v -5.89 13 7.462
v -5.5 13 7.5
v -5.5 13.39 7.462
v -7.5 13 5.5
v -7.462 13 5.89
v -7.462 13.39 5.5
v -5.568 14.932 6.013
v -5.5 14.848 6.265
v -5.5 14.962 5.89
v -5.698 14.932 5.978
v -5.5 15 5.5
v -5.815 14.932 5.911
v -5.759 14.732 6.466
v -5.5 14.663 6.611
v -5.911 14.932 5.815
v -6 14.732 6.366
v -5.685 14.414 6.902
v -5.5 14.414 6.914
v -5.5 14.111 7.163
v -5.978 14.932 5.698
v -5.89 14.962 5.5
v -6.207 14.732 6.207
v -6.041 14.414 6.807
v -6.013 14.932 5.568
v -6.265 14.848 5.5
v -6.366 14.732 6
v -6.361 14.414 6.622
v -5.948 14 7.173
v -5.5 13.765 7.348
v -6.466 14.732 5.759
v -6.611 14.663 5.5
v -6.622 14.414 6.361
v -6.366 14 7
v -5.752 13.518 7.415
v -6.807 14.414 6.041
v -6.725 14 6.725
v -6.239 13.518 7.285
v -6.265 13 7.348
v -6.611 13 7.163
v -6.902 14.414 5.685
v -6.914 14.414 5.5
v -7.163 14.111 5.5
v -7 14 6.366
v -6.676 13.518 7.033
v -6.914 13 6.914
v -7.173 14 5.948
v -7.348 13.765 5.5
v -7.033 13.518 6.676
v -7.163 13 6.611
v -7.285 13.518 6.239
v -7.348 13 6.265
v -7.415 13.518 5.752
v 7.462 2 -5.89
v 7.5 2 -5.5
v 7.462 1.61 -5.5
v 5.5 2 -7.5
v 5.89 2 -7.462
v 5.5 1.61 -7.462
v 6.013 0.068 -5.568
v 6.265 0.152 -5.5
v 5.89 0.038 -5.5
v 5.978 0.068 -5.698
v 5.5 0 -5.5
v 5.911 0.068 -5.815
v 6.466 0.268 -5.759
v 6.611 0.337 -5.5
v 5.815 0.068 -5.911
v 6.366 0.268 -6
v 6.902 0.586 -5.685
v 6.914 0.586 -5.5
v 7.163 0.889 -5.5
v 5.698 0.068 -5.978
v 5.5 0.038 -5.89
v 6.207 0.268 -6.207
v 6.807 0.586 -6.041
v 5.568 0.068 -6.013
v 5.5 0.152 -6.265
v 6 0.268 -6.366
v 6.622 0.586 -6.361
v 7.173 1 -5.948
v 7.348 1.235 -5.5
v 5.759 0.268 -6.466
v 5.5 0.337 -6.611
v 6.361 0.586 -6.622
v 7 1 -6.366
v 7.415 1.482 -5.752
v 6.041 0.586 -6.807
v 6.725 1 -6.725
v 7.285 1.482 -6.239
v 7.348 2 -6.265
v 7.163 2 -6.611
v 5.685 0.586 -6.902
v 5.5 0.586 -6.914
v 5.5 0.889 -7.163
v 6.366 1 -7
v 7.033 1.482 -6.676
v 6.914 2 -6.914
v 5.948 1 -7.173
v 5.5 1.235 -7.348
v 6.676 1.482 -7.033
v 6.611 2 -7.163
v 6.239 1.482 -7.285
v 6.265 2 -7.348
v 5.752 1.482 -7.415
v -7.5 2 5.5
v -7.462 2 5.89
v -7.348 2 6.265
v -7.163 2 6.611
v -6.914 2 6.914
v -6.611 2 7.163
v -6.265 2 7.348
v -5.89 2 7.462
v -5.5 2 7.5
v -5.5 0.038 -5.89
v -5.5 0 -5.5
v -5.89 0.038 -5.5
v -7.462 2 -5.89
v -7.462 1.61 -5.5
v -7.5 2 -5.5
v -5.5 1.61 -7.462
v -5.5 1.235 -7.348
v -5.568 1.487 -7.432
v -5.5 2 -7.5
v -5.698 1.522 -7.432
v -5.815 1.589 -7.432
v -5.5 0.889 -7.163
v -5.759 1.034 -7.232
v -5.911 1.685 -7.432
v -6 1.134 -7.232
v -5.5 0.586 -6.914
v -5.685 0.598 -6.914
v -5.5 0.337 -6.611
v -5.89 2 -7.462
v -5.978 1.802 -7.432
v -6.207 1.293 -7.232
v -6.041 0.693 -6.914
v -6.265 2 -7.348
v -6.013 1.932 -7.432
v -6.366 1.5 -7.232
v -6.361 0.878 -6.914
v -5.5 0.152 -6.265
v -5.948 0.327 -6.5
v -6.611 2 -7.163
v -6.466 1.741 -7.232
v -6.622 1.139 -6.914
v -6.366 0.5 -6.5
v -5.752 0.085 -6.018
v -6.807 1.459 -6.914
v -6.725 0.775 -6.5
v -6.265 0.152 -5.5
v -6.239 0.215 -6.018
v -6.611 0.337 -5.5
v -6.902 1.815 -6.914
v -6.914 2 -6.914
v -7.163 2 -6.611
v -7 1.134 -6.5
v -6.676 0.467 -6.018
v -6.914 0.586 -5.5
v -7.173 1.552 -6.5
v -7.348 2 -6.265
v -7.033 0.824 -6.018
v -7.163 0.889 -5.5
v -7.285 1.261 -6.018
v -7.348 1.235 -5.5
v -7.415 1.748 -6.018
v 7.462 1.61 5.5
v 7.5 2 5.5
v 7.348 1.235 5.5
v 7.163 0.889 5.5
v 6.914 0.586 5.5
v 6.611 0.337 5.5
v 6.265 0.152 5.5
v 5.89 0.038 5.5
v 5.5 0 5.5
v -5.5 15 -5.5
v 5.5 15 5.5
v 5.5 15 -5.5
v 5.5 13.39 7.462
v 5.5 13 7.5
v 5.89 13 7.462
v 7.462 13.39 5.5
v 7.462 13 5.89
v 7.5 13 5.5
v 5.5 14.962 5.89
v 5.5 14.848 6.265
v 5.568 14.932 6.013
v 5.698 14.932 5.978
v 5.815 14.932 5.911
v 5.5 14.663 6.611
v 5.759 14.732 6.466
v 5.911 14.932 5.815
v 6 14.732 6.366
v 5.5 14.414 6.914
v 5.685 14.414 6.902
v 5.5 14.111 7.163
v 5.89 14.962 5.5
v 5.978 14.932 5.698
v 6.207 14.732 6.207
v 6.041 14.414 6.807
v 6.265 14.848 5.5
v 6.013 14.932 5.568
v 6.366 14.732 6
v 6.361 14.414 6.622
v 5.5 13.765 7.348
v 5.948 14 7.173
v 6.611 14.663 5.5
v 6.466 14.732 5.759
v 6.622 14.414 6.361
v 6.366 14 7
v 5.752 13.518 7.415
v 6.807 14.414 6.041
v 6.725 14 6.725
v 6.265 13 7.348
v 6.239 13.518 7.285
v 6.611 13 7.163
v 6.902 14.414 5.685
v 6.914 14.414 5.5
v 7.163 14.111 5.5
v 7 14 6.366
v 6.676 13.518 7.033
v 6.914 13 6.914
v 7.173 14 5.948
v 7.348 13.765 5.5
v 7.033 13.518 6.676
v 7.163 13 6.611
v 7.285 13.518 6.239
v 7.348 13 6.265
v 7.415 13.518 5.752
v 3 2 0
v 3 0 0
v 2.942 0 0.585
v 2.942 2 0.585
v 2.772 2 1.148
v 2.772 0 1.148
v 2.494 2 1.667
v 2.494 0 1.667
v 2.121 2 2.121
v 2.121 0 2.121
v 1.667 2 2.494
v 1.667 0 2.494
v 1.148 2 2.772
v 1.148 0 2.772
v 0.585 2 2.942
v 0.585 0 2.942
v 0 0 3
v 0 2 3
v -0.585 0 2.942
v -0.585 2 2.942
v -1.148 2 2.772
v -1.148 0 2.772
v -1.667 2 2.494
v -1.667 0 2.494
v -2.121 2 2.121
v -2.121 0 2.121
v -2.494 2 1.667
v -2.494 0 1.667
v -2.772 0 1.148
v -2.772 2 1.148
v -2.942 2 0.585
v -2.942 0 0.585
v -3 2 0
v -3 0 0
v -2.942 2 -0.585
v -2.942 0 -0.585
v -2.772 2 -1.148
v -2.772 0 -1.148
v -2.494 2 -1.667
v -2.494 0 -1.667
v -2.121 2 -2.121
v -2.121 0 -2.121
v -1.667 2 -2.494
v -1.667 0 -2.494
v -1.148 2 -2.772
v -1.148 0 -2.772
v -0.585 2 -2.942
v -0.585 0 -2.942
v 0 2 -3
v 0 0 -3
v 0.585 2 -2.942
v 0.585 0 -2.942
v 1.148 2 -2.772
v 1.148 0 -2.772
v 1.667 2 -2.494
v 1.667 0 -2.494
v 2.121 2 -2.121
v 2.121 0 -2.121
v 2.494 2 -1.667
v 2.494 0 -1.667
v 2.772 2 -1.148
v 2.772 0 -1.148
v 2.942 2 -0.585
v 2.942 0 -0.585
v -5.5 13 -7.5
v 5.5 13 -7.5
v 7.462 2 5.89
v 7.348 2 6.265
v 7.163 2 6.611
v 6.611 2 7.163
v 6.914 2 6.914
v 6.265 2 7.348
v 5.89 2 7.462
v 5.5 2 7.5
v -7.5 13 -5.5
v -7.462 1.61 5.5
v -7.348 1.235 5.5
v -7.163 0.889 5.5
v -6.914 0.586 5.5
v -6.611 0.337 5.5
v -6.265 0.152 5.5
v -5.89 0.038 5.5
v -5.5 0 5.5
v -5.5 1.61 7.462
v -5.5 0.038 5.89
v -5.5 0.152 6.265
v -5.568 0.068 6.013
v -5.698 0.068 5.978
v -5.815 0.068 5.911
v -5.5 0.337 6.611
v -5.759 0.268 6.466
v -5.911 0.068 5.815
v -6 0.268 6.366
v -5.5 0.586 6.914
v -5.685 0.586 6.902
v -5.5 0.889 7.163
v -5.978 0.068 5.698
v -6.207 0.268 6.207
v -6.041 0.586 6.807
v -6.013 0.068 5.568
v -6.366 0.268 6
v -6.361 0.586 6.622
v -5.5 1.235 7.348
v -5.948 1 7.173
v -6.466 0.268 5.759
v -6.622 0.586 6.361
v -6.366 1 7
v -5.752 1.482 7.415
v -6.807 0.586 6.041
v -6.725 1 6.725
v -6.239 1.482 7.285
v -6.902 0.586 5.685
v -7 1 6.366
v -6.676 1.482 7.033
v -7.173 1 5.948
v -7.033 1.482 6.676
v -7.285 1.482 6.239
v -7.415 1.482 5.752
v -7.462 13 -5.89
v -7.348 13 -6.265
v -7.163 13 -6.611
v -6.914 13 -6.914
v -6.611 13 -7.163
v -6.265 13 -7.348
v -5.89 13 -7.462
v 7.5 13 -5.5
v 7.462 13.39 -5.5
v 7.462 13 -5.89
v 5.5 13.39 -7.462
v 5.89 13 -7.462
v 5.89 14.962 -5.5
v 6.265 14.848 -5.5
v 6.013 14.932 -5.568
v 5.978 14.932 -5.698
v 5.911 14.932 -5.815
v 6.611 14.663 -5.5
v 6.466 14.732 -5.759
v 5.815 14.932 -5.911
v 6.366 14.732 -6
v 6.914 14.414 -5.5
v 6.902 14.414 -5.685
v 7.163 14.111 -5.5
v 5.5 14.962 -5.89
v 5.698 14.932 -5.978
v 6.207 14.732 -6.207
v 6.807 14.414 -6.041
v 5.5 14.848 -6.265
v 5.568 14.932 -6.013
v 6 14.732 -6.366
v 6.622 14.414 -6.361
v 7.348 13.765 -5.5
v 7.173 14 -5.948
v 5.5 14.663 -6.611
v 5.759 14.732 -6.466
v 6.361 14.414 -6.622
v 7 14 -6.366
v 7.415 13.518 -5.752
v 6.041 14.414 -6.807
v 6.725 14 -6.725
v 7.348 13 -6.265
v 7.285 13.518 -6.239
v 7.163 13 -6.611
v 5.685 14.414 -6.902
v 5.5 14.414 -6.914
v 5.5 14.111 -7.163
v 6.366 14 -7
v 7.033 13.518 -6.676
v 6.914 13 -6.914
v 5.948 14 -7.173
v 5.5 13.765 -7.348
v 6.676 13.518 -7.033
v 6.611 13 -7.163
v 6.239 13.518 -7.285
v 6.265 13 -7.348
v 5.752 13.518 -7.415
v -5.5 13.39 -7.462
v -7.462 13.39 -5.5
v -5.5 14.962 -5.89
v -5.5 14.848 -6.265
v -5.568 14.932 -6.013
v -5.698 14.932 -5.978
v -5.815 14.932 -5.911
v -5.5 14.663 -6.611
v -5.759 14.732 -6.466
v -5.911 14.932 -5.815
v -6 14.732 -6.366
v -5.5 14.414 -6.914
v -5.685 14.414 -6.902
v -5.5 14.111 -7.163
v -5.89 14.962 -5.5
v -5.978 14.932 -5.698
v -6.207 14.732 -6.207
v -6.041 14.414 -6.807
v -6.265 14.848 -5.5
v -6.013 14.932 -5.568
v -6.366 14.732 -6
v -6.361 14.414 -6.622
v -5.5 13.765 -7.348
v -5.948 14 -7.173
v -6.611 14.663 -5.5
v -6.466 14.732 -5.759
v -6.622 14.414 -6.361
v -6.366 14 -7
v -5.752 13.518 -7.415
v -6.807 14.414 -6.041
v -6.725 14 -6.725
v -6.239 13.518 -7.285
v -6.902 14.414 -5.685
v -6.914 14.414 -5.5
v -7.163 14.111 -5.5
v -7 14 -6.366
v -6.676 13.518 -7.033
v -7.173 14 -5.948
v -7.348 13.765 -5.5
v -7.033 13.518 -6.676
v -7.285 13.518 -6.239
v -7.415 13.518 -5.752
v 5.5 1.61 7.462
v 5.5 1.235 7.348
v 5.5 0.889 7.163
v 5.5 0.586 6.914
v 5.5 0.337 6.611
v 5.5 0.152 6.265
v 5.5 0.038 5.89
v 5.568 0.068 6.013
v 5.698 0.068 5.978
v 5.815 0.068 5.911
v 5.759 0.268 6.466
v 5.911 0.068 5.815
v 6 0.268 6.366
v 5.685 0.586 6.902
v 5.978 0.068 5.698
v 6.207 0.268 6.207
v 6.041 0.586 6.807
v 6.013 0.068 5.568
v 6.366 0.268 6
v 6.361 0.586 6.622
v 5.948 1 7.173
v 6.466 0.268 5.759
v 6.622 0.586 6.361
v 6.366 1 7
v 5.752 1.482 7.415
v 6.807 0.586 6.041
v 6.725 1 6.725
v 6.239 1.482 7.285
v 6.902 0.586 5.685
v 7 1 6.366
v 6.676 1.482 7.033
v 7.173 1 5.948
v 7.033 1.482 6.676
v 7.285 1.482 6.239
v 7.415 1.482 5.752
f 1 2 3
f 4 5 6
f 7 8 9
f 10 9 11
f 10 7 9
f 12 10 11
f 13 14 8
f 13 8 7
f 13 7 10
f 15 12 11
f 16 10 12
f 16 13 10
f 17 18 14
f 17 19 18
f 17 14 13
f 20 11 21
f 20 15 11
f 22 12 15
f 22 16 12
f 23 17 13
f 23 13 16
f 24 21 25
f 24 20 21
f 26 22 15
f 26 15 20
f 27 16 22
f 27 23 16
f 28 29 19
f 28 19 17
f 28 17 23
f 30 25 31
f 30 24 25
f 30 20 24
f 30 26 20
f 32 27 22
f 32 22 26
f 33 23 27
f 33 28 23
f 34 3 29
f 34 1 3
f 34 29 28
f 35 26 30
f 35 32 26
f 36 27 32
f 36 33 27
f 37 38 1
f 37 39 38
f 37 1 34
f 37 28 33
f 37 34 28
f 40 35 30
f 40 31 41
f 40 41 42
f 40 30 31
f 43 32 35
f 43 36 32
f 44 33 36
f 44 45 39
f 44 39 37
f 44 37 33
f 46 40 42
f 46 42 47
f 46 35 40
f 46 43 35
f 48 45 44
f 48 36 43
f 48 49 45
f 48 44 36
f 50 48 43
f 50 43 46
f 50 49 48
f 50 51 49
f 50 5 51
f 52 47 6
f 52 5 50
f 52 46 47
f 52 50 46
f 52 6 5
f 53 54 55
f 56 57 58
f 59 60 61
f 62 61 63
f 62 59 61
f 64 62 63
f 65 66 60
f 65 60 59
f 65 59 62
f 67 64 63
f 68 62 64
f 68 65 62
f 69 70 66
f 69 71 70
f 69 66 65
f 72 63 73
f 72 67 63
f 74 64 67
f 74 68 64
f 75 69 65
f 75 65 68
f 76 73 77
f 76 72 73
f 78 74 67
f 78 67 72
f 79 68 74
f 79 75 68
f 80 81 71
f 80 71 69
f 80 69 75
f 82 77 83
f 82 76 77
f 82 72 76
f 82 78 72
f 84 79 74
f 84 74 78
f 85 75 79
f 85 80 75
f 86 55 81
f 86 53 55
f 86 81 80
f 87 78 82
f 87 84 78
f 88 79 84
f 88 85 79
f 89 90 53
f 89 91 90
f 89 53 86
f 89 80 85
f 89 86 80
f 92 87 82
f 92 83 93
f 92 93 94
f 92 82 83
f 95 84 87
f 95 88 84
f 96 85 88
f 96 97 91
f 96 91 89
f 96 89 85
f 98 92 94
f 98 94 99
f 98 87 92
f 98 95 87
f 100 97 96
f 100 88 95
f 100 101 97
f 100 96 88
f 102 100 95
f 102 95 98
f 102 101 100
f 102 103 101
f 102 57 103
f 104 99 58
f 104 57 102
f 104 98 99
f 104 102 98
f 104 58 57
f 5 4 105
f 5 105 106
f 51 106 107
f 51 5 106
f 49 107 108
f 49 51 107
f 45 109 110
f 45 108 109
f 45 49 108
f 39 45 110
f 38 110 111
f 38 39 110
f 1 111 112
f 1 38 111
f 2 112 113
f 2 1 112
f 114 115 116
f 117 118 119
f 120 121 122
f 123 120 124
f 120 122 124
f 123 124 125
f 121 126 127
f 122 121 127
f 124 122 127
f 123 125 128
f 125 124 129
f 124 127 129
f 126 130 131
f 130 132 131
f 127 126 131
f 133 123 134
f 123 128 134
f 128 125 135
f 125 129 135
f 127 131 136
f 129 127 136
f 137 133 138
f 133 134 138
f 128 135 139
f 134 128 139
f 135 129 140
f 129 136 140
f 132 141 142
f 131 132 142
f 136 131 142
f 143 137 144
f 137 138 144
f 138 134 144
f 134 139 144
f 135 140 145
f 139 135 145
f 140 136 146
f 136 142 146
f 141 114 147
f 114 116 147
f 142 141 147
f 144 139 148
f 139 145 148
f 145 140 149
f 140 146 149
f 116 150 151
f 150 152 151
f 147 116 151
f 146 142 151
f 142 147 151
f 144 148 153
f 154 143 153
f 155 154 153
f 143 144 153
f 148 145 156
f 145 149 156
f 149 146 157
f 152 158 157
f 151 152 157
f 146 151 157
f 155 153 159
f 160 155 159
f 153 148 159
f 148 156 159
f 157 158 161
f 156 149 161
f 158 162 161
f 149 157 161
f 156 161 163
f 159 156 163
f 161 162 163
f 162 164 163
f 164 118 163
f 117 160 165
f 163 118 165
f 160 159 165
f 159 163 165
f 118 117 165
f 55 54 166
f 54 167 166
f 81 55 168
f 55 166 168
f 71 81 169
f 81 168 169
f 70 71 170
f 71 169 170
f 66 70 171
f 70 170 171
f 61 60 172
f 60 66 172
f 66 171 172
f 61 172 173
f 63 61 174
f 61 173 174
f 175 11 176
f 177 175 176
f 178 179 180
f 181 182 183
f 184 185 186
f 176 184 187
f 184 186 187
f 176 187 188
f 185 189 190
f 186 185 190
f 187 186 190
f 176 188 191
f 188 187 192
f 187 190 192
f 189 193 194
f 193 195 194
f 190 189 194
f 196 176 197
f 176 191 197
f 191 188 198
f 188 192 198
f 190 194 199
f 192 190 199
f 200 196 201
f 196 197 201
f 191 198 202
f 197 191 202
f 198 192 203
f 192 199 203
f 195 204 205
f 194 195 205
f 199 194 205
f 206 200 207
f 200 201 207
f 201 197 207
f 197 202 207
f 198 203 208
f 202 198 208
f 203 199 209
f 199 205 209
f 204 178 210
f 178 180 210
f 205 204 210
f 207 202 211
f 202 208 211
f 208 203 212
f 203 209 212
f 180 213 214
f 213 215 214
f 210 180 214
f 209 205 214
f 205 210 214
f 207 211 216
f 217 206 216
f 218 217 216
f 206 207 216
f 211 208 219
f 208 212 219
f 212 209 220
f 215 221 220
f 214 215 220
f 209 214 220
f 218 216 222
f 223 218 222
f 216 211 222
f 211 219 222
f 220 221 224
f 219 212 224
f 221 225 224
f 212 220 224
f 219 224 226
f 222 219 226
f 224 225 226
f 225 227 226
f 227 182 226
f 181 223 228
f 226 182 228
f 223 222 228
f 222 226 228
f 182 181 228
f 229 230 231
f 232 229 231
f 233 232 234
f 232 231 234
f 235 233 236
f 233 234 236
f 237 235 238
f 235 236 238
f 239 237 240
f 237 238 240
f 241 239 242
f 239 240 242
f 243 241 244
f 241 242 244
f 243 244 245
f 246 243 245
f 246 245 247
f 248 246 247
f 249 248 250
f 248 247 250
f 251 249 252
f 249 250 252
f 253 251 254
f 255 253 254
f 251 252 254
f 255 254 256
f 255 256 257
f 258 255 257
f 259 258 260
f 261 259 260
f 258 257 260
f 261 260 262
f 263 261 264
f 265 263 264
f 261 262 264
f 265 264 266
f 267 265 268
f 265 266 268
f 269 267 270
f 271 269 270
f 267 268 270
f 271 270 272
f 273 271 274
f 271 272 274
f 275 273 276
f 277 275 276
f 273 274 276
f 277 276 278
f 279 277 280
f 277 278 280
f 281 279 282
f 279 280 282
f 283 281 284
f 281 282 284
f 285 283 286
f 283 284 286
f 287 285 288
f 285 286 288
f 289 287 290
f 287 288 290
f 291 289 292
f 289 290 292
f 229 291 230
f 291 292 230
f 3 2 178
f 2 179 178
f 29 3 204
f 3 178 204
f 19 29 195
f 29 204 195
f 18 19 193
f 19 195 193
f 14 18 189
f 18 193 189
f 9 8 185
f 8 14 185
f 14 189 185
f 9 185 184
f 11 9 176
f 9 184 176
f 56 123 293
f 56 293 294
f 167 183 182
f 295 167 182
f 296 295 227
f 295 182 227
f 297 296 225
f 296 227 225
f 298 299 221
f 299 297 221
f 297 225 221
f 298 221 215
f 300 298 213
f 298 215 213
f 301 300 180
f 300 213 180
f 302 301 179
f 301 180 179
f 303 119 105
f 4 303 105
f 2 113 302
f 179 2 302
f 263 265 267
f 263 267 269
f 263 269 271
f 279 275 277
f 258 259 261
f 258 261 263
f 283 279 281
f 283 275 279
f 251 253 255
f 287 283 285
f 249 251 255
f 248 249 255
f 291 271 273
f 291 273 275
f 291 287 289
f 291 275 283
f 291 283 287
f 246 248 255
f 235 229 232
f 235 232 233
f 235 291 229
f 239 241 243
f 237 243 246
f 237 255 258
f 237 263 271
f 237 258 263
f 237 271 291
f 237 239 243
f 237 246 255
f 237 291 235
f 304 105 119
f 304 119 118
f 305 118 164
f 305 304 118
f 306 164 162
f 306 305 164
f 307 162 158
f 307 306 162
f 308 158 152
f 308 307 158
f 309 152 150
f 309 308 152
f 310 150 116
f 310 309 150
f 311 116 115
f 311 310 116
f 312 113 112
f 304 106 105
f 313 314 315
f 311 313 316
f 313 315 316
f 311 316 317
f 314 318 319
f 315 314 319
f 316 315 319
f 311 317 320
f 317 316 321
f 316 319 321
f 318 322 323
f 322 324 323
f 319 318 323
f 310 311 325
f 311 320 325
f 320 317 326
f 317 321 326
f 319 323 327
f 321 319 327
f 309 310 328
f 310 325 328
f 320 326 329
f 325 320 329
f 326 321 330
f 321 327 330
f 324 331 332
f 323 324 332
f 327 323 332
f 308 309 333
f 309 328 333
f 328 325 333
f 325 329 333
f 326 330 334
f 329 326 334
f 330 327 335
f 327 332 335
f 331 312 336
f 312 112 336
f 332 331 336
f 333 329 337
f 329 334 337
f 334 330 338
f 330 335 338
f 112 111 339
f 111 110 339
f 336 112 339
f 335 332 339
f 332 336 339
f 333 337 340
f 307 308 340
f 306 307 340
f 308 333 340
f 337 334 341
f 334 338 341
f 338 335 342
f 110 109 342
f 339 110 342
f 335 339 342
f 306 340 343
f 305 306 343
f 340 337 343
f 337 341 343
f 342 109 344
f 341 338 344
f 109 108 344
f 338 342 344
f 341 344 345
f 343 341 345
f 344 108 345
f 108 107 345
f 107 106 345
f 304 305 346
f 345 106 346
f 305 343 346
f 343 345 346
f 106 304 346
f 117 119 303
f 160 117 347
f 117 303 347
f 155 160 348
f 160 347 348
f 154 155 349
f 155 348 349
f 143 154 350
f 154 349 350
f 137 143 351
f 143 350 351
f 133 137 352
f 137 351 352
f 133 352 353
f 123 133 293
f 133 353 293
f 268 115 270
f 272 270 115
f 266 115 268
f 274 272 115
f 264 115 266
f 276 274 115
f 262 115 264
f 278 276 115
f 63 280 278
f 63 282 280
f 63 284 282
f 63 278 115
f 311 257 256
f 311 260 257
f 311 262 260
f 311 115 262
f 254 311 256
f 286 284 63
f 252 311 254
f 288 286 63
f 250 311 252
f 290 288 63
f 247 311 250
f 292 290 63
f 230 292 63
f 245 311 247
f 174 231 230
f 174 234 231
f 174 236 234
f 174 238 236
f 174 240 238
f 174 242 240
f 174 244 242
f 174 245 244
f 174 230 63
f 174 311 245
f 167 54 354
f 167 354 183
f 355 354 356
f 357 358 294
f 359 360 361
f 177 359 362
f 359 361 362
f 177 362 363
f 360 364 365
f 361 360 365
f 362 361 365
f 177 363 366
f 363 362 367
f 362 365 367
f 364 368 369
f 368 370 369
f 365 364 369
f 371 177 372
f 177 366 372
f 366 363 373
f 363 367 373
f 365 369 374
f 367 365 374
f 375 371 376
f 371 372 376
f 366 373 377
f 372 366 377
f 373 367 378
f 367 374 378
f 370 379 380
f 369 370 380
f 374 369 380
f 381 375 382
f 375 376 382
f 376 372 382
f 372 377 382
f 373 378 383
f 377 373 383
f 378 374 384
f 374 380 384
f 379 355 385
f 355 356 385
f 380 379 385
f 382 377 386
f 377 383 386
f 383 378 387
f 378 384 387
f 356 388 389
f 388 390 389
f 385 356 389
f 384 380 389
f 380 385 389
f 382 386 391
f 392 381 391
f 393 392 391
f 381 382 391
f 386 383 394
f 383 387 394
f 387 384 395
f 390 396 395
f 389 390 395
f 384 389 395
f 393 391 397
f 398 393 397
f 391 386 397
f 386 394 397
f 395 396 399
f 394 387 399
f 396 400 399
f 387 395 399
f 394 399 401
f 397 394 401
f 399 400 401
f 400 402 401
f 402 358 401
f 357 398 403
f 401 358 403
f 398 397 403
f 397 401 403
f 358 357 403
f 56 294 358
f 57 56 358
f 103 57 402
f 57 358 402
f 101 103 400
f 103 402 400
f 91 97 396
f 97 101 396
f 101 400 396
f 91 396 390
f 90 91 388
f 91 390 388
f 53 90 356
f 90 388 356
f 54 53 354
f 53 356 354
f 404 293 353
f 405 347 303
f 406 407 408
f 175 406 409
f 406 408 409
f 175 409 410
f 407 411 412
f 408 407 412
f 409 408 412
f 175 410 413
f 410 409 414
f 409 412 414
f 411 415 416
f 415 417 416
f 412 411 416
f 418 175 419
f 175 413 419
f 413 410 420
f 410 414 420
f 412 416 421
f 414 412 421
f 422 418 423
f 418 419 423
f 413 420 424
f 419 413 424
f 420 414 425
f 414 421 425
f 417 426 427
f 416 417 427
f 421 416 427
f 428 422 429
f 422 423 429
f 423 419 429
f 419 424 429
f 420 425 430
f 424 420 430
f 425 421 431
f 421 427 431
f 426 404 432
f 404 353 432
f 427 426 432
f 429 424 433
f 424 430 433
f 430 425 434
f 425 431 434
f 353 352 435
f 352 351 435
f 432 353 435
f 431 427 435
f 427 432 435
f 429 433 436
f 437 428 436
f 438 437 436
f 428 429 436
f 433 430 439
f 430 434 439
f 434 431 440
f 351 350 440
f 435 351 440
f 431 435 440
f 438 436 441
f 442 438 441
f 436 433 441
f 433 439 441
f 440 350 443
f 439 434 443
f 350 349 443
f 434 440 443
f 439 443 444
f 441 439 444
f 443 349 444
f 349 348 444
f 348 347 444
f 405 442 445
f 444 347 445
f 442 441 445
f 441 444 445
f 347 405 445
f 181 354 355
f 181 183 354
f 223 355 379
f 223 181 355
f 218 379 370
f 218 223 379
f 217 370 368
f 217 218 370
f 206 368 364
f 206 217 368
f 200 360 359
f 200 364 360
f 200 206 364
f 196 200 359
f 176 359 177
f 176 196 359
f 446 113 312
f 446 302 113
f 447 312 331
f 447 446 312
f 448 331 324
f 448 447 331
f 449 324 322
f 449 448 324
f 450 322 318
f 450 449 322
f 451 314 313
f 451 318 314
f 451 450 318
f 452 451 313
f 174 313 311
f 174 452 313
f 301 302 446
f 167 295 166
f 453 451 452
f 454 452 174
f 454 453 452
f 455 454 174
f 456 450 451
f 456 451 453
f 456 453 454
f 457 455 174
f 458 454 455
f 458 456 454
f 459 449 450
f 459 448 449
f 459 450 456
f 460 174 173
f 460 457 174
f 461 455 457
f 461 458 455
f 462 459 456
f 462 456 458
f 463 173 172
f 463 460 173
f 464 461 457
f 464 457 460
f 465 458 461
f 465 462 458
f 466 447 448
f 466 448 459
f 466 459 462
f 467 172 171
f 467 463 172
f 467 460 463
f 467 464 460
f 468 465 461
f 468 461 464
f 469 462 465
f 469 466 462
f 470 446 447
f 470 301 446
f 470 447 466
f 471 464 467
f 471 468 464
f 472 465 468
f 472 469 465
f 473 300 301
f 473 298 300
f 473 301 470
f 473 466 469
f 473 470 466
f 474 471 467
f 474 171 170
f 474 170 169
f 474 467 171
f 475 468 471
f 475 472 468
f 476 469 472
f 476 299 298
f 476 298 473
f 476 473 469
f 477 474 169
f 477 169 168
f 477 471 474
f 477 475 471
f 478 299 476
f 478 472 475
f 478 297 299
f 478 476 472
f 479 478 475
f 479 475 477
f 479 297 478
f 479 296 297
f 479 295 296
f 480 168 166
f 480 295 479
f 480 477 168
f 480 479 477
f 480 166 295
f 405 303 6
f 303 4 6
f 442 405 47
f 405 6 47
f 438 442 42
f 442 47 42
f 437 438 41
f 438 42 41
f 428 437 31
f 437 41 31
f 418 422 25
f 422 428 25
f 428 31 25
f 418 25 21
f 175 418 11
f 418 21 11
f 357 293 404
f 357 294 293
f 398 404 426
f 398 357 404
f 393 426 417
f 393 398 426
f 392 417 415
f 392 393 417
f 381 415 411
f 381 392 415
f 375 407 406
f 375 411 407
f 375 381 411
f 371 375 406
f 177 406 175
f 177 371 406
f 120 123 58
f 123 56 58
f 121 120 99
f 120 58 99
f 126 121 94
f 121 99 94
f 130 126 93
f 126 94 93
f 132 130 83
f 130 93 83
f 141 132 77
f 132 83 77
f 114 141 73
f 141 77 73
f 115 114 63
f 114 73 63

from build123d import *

# Parameters (mm, degrees)
F0_W     = 15
F0_H     = 15
F1_DEPTH = 15
F2_R     = 2
F3_R     = 3
F4_DEPTH = 2


with BuildPart() as f1:
    # F0 (on Front) → F1 (new body)
    with BuildSketch(Plane.XZ):
        Rectangle(F0_W, F0_H)
    extrude(amount=-F1_DEPTH)

    # F2
    f2_edges = [f1.edges().sort_by_distance(p)[0] for p in [
        (7.5, 7.5, 7.5),
        (-7.5, 7.5, 7.5),
        (0, 0, 7.5),
        (0, 15, 7.5),
        (7.5, 7.5, -7.5),
        (7.5, 0, 0),
        (7.5, 15, 0),
        (-7.5, 0, 0),
        (0, 0, -7.5),
        (-7.5, 7.5, -7.5),
        (0, 15, -7.5),
        (-7.5, 15, 0),
    ]]
    fillet(f2_edges, radius=F2_R)

    # F3 (on face) → F4 (cut)
    with BuildSketch(Plane.XZ):
        Circle(F3_R)
    extrude(amount=-F4_DEPTH, mode=Mode.SUBTRACT)


solid = f1.part
